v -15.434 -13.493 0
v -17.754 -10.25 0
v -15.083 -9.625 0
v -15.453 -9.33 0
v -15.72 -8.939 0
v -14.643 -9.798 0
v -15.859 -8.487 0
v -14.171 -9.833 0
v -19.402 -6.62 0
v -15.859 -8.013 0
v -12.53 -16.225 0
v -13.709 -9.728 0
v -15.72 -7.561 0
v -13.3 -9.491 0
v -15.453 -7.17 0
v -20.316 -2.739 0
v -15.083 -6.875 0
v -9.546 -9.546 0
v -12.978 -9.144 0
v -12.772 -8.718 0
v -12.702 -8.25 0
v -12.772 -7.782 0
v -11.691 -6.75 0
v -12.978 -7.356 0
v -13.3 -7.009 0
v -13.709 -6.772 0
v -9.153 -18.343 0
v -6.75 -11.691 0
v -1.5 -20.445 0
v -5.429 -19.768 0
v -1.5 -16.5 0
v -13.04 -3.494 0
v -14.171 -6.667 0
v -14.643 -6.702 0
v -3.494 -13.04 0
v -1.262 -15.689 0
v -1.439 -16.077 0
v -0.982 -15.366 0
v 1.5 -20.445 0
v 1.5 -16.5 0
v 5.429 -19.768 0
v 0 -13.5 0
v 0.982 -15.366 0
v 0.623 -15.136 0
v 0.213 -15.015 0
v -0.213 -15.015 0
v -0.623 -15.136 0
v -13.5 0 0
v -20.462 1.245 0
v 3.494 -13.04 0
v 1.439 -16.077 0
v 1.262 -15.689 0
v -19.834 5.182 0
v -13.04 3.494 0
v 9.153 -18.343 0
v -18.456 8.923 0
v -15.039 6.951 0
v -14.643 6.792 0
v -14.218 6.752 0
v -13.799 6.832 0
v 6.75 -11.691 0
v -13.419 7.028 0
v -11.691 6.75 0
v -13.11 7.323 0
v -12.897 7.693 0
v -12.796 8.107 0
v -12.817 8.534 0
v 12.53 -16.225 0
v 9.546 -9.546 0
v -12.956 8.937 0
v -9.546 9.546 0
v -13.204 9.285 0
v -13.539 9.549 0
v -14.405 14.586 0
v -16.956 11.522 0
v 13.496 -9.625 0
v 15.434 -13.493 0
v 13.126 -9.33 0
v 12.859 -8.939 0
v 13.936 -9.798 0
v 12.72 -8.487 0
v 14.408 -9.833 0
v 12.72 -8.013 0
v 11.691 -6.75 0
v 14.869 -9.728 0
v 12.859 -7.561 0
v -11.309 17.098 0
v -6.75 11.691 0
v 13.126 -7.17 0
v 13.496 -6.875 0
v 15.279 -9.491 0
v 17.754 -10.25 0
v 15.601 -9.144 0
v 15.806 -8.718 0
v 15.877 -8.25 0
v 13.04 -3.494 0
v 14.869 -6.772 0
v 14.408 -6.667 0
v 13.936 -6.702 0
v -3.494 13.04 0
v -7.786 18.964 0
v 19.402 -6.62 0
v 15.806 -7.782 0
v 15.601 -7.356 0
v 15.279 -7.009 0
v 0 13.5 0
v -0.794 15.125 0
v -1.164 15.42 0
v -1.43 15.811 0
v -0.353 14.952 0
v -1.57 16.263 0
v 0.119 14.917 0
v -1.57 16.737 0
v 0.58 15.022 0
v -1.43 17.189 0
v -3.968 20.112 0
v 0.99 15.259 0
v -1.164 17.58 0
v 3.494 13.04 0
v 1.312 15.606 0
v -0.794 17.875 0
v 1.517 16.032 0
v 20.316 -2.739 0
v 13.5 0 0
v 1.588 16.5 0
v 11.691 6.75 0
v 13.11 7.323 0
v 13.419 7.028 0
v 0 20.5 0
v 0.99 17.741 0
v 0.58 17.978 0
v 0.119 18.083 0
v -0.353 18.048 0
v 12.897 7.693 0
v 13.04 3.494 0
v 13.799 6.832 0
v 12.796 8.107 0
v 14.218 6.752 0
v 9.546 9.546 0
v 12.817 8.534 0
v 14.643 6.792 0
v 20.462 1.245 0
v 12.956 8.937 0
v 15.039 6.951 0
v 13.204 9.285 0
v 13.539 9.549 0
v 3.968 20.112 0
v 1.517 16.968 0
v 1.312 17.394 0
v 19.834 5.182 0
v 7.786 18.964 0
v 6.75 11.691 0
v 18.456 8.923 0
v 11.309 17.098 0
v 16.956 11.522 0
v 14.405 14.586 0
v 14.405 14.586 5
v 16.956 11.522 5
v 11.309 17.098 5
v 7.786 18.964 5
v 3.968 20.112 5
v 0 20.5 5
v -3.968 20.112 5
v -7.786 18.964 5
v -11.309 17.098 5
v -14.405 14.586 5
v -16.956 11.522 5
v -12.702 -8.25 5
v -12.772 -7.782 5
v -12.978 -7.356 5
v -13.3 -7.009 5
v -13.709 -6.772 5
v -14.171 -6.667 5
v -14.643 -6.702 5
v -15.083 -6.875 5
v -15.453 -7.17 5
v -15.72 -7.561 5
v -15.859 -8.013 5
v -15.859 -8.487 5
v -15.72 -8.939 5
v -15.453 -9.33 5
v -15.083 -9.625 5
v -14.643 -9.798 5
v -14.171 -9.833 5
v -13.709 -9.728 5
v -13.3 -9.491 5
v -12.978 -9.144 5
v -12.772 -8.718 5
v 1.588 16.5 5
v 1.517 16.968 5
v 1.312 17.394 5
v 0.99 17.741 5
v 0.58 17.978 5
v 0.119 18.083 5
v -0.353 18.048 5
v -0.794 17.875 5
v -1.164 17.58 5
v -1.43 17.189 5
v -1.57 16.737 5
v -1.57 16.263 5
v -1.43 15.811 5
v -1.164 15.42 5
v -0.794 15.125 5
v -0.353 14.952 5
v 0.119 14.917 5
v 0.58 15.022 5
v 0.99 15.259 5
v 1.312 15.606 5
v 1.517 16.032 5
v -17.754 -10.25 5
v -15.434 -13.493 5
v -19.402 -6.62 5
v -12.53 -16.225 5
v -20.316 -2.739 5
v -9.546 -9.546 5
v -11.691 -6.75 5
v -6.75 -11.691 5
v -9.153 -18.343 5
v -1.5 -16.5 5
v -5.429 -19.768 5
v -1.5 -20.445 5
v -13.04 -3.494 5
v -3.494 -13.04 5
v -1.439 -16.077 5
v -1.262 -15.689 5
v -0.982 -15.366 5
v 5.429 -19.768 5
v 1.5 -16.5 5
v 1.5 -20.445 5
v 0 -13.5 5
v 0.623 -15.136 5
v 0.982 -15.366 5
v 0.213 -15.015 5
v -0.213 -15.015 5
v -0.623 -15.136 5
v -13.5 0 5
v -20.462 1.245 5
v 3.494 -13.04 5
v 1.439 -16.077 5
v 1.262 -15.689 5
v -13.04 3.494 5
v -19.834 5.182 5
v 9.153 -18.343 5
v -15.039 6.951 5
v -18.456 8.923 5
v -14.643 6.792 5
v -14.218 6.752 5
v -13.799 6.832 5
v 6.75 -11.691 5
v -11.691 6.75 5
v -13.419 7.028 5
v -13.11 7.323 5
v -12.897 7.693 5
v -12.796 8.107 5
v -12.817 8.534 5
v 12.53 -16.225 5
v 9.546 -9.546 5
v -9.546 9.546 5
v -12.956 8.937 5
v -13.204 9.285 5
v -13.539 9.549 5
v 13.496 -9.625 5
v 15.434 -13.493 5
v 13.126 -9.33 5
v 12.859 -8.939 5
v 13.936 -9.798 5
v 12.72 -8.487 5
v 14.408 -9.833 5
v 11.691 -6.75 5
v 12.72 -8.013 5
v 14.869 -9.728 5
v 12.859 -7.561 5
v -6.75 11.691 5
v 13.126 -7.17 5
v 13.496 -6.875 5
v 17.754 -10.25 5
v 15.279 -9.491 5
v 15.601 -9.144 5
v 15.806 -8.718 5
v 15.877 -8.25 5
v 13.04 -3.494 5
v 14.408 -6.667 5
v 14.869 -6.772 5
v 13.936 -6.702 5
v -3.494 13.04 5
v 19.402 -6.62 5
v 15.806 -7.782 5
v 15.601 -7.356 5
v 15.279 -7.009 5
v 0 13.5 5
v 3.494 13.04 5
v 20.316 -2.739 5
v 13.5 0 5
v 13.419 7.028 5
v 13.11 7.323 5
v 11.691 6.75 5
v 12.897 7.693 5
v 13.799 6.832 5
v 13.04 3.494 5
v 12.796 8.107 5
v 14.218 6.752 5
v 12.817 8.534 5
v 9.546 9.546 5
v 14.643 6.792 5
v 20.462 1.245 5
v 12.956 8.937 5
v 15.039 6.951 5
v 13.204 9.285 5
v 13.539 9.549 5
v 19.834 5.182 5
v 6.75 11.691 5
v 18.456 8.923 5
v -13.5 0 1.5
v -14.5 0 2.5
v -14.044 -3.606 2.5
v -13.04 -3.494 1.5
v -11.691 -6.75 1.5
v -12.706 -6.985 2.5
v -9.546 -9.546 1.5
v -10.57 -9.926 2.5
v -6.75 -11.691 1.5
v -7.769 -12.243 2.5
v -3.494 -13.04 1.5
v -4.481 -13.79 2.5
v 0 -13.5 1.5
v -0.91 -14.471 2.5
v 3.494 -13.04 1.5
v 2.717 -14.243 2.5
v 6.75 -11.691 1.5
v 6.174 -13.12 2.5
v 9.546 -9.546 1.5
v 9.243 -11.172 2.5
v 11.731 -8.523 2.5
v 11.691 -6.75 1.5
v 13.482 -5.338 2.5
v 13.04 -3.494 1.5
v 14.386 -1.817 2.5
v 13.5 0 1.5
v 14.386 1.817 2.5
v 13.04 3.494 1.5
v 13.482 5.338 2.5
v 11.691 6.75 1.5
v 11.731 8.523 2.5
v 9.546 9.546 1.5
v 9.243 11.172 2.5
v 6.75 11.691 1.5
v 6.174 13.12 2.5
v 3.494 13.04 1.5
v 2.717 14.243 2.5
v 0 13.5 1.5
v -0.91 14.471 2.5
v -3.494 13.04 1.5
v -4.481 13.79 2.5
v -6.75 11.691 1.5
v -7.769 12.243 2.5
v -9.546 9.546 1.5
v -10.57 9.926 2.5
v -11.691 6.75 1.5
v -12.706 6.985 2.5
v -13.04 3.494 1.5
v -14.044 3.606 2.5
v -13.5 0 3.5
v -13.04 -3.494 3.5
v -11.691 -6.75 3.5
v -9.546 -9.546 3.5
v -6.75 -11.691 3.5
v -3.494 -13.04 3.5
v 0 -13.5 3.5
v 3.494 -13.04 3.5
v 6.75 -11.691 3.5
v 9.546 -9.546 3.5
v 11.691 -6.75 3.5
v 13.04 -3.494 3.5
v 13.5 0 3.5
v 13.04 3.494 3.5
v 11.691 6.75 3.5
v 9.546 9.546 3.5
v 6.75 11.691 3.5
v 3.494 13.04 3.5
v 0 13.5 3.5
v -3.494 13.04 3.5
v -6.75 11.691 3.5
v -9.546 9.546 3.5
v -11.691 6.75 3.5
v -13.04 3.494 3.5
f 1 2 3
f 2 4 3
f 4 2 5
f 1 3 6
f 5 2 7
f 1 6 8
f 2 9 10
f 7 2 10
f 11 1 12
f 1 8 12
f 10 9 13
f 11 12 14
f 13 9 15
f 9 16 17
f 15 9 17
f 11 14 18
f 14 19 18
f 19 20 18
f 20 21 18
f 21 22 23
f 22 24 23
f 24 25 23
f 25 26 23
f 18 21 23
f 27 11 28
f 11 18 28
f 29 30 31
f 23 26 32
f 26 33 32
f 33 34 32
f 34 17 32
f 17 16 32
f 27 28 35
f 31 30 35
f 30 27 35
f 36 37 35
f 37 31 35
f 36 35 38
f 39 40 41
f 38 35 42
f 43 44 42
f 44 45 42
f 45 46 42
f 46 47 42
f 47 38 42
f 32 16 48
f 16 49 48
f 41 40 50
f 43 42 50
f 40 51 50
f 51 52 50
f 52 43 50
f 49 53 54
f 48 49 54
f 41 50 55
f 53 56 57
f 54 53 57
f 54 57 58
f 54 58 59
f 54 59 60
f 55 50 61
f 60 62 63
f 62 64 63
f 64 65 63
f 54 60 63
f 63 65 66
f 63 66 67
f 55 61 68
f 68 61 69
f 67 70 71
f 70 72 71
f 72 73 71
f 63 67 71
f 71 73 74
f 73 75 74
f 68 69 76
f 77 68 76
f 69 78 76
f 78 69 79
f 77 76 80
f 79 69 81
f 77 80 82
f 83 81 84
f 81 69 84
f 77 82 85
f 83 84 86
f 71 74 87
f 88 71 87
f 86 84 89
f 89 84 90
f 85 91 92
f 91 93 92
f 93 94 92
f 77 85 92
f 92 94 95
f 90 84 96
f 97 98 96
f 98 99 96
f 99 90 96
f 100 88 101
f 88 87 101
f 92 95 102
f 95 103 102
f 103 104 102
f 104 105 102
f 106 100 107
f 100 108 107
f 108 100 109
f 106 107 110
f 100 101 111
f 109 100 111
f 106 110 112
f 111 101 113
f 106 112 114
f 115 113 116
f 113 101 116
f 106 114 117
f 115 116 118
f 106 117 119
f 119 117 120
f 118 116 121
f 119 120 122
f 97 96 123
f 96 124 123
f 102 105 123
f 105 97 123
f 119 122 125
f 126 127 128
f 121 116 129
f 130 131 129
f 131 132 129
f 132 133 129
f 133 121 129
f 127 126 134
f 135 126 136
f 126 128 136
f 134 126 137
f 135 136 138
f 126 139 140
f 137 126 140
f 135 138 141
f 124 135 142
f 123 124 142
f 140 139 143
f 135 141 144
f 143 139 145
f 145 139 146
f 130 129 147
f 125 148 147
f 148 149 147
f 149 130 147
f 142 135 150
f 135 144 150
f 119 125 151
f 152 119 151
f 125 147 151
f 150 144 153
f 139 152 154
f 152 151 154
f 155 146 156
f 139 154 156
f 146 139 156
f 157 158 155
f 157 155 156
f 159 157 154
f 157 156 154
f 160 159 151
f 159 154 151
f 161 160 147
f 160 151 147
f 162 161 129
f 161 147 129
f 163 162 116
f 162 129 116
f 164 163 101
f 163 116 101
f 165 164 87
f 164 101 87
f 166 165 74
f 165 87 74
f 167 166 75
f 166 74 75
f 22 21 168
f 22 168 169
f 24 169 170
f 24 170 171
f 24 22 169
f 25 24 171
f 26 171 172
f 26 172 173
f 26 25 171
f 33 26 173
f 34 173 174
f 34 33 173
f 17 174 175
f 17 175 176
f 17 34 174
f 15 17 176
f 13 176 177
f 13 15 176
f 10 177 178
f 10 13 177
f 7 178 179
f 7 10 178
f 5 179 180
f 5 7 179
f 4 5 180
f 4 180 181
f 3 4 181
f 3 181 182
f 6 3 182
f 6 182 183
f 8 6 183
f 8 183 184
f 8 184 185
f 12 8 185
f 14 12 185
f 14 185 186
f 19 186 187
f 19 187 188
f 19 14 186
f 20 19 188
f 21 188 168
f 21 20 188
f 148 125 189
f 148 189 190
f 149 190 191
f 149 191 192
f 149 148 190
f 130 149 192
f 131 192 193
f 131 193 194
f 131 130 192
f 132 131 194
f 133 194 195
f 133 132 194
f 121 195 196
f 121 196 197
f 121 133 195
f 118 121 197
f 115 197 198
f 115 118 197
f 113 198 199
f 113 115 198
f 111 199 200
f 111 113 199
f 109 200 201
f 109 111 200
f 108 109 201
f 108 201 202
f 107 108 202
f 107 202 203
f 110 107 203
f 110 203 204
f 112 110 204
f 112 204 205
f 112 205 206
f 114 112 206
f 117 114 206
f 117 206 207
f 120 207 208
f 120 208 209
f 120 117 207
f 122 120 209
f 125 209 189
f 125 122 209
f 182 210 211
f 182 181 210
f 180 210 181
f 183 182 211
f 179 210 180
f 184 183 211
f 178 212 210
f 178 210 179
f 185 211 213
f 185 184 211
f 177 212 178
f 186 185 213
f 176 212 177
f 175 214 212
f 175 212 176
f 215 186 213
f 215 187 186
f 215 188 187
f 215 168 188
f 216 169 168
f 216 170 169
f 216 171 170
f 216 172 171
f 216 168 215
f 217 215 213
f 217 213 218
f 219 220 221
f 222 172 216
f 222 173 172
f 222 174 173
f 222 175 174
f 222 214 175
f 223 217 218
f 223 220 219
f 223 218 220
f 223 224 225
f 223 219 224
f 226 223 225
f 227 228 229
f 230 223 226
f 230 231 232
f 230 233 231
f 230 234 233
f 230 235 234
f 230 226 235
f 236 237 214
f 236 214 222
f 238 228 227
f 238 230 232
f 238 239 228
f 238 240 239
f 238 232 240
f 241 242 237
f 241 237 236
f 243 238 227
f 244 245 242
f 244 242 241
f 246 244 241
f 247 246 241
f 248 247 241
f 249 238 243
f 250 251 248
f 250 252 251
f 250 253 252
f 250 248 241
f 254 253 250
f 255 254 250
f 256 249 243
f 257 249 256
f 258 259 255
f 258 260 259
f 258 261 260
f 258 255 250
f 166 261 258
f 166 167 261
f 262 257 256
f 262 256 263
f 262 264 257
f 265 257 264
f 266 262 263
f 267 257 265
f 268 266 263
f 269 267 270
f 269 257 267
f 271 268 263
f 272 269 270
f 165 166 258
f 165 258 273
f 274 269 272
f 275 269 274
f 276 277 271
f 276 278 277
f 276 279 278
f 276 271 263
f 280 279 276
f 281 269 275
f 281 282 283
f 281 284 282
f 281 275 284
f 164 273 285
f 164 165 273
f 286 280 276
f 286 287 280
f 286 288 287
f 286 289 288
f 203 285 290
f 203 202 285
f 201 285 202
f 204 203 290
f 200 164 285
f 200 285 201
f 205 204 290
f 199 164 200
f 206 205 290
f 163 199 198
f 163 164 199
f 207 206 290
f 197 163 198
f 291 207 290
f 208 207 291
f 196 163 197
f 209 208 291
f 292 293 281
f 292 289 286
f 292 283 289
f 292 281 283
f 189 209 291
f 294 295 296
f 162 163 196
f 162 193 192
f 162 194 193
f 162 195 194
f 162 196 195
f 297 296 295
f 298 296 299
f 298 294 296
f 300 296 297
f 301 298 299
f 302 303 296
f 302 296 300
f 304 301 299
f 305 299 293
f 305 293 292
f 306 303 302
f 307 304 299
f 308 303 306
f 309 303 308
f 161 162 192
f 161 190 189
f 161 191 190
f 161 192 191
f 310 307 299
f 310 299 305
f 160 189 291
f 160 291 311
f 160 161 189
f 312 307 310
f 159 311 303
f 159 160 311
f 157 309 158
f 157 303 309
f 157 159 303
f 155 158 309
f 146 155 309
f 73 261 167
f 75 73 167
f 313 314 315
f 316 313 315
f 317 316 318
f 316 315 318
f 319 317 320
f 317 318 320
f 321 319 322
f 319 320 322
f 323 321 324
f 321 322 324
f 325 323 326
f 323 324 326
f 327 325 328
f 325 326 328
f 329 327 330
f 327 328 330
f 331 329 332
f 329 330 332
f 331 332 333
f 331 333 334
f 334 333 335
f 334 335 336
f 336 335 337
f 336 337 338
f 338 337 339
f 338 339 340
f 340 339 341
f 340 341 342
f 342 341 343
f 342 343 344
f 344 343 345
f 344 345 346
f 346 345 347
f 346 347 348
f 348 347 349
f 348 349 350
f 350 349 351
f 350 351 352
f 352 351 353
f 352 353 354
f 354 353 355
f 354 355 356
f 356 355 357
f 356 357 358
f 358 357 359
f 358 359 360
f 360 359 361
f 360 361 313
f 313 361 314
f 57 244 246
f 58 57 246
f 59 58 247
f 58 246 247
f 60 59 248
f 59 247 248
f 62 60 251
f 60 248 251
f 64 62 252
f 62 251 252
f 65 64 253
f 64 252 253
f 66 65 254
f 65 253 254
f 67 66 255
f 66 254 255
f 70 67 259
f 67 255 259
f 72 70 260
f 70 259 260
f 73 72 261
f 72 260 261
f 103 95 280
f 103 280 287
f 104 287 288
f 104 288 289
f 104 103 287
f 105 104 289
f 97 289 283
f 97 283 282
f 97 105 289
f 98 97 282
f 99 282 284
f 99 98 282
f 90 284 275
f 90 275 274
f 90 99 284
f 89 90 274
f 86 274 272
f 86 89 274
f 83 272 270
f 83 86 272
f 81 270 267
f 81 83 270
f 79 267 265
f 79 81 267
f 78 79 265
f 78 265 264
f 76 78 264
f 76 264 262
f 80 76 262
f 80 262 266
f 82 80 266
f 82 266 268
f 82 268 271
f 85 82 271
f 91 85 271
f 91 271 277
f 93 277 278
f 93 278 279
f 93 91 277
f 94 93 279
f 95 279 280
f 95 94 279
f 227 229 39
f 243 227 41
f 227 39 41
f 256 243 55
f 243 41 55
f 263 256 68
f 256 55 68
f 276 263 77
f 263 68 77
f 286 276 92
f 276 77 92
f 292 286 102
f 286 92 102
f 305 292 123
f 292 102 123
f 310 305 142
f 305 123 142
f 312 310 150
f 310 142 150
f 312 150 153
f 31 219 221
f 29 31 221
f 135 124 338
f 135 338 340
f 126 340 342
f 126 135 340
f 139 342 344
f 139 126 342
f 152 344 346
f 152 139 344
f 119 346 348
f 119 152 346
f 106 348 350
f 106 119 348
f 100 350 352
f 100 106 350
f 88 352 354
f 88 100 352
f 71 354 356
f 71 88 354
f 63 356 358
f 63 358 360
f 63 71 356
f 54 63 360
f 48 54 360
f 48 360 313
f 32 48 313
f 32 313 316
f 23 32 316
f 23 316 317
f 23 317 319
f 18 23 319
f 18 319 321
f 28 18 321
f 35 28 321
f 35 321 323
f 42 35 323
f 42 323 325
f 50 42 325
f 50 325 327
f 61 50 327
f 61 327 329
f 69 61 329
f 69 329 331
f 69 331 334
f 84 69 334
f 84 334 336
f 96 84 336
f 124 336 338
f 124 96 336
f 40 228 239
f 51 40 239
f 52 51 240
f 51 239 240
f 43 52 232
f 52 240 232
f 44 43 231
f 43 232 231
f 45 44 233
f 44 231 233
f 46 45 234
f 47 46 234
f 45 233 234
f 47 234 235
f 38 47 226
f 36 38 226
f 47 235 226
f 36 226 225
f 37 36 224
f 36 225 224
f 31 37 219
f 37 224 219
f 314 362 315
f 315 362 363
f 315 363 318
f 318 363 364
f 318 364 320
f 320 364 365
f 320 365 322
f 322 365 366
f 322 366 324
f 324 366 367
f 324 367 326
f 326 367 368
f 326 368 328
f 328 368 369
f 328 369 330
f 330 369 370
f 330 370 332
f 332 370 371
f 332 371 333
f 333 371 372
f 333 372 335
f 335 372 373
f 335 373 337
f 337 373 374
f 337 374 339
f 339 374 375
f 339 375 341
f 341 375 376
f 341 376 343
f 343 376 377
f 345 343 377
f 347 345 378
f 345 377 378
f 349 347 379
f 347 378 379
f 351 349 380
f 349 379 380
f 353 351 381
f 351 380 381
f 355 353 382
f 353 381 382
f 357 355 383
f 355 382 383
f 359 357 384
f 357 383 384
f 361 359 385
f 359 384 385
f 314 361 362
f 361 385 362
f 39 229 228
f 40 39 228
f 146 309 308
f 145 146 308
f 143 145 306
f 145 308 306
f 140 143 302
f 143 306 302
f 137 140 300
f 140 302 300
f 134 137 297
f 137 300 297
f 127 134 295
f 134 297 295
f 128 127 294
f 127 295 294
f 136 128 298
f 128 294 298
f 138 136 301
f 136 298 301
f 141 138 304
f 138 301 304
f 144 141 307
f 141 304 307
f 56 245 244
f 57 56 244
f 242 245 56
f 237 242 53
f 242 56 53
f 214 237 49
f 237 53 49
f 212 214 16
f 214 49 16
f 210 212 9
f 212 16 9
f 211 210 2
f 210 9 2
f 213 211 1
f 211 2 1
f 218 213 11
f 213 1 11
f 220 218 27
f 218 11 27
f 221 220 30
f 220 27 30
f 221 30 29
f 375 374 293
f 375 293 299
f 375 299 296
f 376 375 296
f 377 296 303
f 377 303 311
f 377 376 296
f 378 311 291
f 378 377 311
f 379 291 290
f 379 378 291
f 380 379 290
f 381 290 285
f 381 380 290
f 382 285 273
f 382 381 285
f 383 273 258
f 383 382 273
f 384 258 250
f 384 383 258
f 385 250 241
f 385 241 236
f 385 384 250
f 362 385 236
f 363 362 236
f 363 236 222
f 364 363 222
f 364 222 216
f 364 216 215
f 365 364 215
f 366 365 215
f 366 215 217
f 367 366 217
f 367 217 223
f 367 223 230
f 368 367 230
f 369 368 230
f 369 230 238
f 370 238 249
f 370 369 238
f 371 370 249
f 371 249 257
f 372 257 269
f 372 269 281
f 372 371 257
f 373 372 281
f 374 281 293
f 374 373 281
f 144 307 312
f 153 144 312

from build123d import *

# Parameters (mm, degrees)
SKETCH1_R          = 20.5
SKETCH1_R_2        = 13.5
SKETCH1_R_3        = 1.5875
EXTRUDE1_DEPTH     = 5
CUT_EXTRUDE1_DEPTH = 30.419381367
CIRPATTERN1_COUNT  = 3


with BuildPart() as part:
    # Sketch1 → Extrude1 (new body)
    with BuildSketch(Plane.XY):
        Circle(SKETCH1_R)
        Circle(SKETCH1_R_2, mode=Mode.SUBTRACT)
        with Locations((0, 16.5)):
            Circle(SKETCH1_R_3, mode=Mode.SUBTRACT)
        with Locations((14.289419162, -8.25)):
            Circle(SKETCH1_R_3, mode=Mode.SUBTRACT)
        with Locations((-14.289419162, -8.25)):
            Circle(SKETCH1_R_3, mode=Mode.SUBTRACT)
    extrude(amount=EXTRUDE1_DEPTH)

    # Sketch2 → Cut-Extrude1 (cut, through all)
    with BuildSketch(Plane.XY.offset(5)):
        with BuildLine():
            ThreePointArc((1.5, -16.5), (0, -15), (-1.5, -16.5))
            Line((-1.5, -16.5), (-1.5, -20.4450483))
            ThreePointArc((-1.5, -20.4450483), (0, -20.5), (1.5, -20.4450483))
            Line((1.5, -20.4450483), (1.5, -16.5))
        make_face()
    cut_extrude1 = extrude(amount=-CUT_EXTRUDE1_DEPTH, mode=Mode.SUBTRACT)

    # Sketch4 → Cut-Revolve3 (revolve, cut)
    with BuildSketch(Plane(origin=(0, 0, 0), x_dir=(1, 0, 0), z_dir=(0, 1, 0))):
        Polygon((-13.5, -1.5), (-14.5, -2.5), (-13.5, -3.5), align=None)
    revolve(axis=Axis((0, 0, 0), (0, 0, 1)), mode=Mode.SUBTRACT)

    # CirPattern1: Cut-Extrude1 ×3 about axis
    cirpattern1_axis = Axis((0, 0, 5), (0, 0, -1))
    for i in range(1, CIRPATTERN1_COUNT):
        add(cut_extrude1.rotate(cirpattern1_axis, i * 360 / CIRPATTERN1_COUNT), mode=Mode.SUBTRACT)


solid = part.part
